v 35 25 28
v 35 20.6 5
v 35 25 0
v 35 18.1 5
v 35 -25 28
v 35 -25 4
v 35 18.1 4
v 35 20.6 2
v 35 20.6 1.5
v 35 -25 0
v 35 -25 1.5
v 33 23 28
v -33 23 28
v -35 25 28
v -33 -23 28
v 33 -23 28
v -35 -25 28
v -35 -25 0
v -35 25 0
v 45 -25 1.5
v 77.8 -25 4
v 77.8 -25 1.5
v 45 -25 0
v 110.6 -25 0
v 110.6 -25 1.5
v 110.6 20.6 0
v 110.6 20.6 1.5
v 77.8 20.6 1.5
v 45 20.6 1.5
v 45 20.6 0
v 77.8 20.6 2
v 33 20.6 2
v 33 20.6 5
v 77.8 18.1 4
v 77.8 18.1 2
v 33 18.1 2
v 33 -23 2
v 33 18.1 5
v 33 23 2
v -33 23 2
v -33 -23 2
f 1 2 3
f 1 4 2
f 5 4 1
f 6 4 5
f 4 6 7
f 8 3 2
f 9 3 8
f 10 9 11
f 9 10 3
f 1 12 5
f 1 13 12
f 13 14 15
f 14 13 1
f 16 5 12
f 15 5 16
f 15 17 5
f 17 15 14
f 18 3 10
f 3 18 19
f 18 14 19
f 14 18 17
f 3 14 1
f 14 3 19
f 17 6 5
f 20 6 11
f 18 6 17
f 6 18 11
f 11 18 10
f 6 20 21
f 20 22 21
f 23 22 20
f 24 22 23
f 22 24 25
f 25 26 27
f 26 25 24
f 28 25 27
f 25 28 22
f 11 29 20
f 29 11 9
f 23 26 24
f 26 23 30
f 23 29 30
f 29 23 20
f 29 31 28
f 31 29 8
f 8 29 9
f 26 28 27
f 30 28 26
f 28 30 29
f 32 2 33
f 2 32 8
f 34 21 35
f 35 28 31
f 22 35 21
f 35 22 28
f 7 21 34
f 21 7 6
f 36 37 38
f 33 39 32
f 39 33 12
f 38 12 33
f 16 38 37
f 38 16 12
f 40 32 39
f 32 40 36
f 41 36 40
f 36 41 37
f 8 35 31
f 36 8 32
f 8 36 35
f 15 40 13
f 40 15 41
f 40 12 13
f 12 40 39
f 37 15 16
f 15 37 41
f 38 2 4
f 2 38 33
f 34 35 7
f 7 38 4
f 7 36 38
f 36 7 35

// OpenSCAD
// Two-part enclosure for small electronics board
// Print orientation: both parts on the bed, lid on +X side of box

// ---- Box ----
box_x = 70;      // outer length (X)
box_y = 50;      // outer width (Y)
box_z = 30;      // outer height (Z)
wall = 2;        // wall thickness
floor = 2;       // floor thickness

// ---- Lid ----
lip_w = 65.6;    // lip outer length (X)
lip_d = 45.6;    // lip outer width (Y)
lip_h = 4;       // lip height (Z)
lip_t = 1.5;     // lip wall thickness

// ---- Misc ----
eps = 0.5;       // cutter overshoot
gap = 10;        // gap between parts

$fn = 64;

lip_r = lip_h - lip_t;  // lip inner height

difference() {
    union() {
        // Box
        translate([-box_x/2, -box_y/2, 0])
            cube([box_x, box_y, box_z - floor]);
        // Lid (printed upside down, lip on top)
        translate([box_x/2 + gap, -box_y/2, 0])
            cube([lip_w, lip_d, lip_t]);
        translate([box_x/2 + gap - lip_w/2, -box_y/2, lip_t])
            cube([lip_w, lip_d, lip_r]);
    }
    // Open top of box
    translate([-box_x/2 + wall, -box_y/2 + wall, floor])
        cube([box_x - 2*wall, box_y - 2*wall, box_z - floor + eps]);
    // Lip pocket
    translate([box_x/2 + gap - lip_w/2, -box_y/2 + lip_d - lip_r, lip_t + eps])
        cube([lip_w, lip_r, lip_r + eps]);
}
